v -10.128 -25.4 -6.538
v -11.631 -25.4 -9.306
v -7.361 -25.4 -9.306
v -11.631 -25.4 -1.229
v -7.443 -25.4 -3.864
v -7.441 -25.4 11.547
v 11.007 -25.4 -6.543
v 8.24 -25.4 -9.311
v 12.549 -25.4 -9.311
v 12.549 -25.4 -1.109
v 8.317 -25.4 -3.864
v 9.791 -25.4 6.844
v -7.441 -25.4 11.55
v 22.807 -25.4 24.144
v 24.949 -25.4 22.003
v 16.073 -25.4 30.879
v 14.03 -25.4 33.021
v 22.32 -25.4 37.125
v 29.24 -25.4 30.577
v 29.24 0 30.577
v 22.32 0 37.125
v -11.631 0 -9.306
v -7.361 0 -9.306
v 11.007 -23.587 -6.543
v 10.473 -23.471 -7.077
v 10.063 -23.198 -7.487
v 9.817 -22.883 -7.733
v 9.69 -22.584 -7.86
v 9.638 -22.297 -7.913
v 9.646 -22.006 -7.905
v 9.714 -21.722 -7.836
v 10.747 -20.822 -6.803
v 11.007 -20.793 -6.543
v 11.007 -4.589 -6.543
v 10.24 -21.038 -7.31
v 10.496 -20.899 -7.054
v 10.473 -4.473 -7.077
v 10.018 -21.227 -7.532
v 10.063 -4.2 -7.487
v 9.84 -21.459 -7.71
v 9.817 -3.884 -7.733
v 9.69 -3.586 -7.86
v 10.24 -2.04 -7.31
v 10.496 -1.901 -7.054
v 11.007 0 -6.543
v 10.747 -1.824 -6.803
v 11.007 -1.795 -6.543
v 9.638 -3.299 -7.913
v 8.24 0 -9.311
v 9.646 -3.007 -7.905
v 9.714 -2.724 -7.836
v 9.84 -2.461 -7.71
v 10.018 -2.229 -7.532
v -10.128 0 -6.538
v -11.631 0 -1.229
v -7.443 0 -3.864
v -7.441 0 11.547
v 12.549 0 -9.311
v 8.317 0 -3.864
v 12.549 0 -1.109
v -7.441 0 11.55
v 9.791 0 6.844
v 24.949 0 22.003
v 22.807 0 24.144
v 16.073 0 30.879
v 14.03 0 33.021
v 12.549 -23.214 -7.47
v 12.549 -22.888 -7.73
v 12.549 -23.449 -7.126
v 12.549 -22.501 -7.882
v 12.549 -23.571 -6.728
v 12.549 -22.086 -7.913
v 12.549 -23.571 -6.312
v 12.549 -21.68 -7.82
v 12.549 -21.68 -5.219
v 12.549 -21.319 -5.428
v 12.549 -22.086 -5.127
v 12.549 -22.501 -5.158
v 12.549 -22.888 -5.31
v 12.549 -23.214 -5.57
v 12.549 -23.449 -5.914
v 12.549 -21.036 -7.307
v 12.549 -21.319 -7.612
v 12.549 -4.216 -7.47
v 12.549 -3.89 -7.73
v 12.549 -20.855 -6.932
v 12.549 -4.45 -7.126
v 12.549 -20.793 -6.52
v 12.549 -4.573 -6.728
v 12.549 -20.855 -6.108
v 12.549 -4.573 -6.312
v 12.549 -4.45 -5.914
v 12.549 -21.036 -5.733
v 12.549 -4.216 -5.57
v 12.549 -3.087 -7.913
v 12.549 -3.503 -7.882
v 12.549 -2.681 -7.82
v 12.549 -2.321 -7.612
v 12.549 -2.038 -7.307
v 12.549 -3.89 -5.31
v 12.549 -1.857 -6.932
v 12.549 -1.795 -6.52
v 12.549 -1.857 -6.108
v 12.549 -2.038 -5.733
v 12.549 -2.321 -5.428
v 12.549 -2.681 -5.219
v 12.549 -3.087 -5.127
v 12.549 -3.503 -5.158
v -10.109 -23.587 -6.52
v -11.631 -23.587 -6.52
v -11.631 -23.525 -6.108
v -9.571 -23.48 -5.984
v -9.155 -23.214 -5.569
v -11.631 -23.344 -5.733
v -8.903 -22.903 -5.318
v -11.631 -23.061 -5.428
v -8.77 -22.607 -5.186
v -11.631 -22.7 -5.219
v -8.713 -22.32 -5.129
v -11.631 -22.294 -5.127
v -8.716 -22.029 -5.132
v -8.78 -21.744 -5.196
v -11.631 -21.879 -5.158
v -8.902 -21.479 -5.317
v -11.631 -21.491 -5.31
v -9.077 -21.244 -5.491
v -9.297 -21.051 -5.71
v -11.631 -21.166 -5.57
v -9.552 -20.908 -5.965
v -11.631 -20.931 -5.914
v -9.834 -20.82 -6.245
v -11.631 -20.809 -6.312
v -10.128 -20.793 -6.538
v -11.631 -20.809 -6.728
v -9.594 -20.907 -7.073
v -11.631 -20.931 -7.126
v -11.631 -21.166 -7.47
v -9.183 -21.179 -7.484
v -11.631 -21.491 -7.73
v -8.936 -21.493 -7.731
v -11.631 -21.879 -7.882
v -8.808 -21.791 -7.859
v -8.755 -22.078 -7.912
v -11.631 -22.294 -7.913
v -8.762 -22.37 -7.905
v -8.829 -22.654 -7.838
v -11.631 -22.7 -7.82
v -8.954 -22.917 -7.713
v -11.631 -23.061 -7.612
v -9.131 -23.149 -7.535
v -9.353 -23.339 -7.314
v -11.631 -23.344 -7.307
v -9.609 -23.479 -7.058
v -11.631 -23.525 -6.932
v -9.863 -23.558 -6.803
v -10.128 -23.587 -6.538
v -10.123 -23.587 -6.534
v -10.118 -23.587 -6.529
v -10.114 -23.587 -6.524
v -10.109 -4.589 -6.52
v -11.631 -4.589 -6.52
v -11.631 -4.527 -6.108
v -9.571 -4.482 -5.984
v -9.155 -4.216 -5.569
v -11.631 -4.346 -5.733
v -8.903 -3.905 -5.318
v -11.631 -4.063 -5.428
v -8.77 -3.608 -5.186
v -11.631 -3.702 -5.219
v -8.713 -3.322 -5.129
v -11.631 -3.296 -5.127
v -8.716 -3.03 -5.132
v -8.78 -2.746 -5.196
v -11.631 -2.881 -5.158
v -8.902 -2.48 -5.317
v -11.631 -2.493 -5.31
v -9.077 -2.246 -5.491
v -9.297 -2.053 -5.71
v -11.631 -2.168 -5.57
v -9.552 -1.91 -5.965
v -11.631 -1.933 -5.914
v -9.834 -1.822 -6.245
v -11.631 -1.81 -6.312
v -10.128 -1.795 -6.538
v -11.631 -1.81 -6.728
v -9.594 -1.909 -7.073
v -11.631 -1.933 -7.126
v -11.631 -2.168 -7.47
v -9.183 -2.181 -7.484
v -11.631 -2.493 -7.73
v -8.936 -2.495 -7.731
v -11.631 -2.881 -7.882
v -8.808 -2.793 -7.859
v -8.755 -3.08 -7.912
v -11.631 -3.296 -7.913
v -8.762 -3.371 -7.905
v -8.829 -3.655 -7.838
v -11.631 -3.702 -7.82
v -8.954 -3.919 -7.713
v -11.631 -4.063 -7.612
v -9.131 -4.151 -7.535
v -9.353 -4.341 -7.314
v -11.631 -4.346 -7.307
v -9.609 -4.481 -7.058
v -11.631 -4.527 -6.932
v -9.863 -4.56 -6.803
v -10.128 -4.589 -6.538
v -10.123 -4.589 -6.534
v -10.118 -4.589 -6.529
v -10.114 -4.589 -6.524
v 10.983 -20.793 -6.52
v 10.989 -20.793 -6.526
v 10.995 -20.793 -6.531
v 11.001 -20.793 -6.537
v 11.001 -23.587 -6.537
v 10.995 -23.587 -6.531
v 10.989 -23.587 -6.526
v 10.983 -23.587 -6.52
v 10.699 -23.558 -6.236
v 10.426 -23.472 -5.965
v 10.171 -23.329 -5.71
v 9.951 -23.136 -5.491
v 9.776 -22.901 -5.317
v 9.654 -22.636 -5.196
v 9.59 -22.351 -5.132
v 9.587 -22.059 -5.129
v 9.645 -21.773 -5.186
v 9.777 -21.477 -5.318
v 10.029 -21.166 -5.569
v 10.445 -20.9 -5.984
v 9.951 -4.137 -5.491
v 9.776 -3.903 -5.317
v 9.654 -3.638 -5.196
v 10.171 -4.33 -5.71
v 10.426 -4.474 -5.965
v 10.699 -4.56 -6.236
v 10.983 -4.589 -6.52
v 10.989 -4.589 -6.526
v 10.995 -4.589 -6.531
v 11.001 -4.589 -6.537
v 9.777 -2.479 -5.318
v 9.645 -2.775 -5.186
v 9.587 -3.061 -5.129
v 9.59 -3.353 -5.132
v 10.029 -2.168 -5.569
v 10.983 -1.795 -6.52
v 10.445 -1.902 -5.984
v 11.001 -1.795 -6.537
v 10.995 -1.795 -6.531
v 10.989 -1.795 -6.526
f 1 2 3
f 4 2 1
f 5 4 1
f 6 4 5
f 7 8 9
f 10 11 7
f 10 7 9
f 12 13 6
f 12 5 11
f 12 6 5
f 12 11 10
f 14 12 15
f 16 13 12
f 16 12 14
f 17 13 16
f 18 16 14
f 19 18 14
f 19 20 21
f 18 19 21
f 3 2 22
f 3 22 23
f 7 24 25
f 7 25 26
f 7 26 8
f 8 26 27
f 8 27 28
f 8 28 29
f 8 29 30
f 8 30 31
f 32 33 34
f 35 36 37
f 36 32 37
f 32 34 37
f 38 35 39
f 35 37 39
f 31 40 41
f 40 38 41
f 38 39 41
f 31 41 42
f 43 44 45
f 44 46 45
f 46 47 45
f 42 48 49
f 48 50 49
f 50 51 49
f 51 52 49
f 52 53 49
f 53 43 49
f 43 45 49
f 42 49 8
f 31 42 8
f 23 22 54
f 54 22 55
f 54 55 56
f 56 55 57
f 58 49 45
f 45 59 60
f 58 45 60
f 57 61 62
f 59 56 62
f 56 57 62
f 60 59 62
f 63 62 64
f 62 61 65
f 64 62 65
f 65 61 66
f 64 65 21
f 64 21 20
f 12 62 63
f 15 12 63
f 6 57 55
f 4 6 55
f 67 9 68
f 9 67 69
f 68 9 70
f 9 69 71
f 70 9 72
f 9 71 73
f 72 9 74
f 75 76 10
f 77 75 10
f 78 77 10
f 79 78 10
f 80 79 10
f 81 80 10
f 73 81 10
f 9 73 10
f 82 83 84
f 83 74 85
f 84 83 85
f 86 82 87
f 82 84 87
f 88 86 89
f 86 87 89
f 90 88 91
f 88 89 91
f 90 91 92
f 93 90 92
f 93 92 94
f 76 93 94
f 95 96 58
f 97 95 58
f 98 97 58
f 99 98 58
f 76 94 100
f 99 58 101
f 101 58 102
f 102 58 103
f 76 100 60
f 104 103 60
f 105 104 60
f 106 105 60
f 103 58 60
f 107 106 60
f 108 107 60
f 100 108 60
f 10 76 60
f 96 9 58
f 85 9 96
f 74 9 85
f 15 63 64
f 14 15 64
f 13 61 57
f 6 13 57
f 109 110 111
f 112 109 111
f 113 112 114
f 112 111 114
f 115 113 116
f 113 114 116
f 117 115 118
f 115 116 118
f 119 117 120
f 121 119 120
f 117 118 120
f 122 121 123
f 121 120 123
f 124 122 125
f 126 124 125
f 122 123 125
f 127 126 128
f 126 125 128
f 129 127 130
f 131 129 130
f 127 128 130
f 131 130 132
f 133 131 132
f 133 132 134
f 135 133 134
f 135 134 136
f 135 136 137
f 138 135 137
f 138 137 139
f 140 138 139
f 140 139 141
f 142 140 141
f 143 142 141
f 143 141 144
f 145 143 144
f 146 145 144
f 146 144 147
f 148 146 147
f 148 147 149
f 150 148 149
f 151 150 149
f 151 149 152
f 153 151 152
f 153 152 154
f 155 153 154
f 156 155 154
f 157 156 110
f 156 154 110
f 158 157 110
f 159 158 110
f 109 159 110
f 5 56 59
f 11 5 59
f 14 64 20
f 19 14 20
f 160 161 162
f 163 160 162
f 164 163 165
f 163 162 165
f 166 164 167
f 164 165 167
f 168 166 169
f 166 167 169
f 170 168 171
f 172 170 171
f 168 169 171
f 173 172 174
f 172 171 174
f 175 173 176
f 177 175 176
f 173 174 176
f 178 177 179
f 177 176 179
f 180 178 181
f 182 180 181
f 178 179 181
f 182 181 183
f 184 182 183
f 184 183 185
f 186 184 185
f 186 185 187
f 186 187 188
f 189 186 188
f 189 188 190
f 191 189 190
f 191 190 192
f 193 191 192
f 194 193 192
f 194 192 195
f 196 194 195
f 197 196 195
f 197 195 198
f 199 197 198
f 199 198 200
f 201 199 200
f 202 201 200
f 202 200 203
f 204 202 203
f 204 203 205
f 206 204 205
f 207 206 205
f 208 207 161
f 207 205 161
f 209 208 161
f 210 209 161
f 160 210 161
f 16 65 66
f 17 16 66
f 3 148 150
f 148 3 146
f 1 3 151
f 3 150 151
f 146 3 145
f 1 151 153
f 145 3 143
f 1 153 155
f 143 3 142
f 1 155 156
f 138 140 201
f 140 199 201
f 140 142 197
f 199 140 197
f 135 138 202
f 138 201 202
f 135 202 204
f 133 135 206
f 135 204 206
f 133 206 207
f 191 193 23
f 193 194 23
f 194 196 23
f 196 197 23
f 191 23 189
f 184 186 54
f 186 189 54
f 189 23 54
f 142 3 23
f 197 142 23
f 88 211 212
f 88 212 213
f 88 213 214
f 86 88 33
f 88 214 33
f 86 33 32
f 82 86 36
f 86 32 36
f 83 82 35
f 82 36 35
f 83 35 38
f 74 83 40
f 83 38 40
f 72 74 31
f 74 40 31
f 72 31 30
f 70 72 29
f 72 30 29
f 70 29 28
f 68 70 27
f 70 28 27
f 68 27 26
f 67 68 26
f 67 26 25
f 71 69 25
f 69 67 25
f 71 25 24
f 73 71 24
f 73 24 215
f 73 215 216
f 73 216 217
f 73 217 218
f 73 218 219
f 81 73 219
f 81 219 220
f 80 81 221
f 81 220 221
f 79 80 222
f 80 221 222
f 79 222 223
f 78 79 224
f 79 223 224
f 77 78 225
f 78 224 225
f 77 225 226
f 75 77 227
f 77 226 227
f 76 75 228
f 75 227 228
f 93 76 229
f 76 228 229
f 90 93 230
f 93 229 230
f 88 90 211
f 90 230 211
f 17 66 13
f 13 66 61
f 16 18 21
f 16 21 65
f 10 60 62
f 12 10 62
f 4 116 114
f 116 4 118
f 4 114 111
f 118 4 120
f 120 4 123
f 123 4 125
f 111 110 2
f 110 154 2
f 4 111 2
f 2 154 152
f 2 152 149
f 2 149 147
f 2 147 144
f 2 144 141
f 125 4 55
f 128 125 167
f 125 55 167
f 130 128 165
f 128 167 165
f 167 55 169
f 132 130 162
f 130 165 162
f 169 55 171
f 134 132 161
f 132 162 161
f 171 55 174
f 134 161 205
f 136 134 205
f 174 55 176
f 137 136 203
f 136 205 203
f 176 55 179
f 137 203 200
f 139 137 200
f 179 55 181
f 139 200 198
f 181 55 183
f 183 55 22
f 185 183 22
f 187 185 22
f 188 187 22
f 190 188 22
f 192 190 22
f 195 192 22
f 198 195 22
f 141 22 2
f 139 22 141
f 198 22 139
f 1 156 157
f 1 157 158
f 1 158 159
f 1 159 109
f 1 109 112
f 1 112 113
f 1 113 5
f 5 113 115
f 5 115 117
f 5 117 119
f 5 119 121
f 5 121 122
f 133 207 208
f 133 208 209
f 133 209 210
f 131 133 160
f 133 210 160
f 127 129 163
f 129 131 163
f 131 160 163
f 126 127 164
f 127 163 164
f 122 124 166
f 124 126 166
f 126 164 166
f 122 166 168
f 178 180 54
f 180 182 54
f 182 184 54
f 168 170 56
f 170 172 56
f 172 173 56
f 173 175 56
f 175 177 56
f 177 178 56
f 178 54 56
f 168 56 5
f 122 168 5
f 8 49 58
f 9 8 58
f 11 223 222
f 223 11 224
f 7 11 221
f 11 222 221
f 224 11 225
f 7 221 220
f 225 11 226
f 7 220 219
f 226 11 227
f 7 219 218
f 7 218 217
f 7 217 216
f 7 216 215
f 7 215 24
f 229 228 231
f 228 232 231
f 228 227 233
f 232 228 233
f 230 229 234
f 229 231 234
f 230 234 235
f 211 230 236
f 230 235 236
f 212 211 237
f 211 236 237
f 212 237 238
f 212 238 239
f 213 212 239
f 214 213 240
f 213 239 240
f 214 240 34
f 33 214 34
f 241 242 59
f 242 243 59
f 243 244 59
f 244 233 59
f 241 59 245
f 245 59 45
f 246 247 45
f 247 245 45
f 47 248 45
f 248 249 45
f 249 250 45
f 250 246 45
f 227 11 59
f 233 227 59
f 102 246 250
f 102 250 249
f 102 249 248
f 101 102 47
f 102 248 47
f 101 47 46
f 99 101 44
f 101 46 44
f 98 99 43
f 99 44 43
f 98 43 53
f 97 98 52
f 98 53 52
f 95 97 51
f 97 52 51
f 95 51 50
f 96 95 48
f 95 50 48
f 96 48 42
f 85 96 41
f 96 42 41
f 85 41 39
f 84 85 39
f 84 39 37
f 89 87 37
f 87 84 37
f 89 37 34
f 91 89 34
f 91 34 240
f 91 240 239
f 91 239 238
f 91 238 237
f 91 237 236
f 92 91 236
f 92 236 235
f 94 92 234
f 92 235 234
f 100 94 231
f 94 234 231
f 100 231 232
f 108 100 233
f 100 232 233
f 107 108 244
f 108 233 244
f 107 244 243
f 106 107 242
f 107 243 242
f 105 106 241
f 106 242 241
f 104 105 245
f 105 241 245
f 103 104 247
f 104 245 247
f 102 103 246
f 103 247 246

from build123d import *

# Parameters (mm, degrees)
F1_DEPTH = 25.4
F3_D     = 2.794
F3_DEPTH = 25.4
F3_TIP   = 0.8394022848
F4_D     = 2.794
F4_DEPTH = 25.4
F4_START = 10.1278152
F4_TIP   = 0.8394022848


# Not quite as in the source:
# - ends of sketch curves that miss each other by under 0.0002 mm in the source are joined
# - a feature names something its author has since deleted; it is built from what else it names


with BuildPart() as f1:
    # F0 (on Front) → F1 (new body)
    with BuildSketch(Plane.XZ):
        Polygon((11.0066256276, -6.5430273301), (8.240193387, -9.310965985), (12.5485987193, -9.310965985), (12.5485987193, -1.1086727812), (9.7906497979, 6.8444932552), (24.9488617122, 22.0027051695), (22.8072959293, 24.1442709524), (29.2404852808, 30.5774603039), (22.3196721338, 37.1254323684), (16.0729033236, 30.8786635582), (14.0302290969, 33.0205648235), (13.9806155776, 32.9709513042), (-7.4406042695, 11.5497314571), (-7.4406041338, 11.5466563515), (-7.4413635659, 11.5474157835), (-11.6305711889, -1.2286720797), (-11.6305711889, -9.3063699081), (-7.3613829189, -9.3063699081), (-10.1278151595, -6.5384312532), (-7.4425795762, -3.8636476732), (8.3167760077, -3.8636476732), align=None)
    extrude(amount=F1_DEPTH)

    # F3 (one way)
    with BuildSketch(Plane(origin=(0, 0, 0), x_dir=(0, 1, 0), z_dir=(-1, 0, 0))):
        with Locations((-22.1899207681, 6.5197679214), (-3.1917574815, 6.5197679214)):
            Circle(F3_D / 2)
    extrude(amount=-F3_DEPTH, mode=Mode.SUBTRACT)
    with Locations(Plane(origin=(0, 0, 0), x_dir=(0, 1, 0), z_dir=(-1, 0, 0))):
        with Locations((-22.1899207681, 6.5197679214), (-3.1917574815, 6.5197679214)):
            with Locations((0, 0, -(F3_DEPTH + F3_TIP / 2))):  # 118° drill point
                Cone(0, F3_D / 2, F3_TIP, mode=Mode.SUBTRACT)

    # F4
    # its depths count from where the whole tool has entered the part; down to there all is cleared
    with Locations(Plane.YZ.offset(-F4_START)):
        with Locations((-3.1917574815, -6.5197679214), (-22.1899207681, -6.5197679214)):
            Hole(F4_D / 2, depth=F4_DEPTH)
            with Locations((0, 0, -(F4_DEPTH + F4_TIP / 2))):  # 118° drill point
                Cone(0, F4_D / 2, F4_TIP, mode=Mode.SUBTRACT)


solid = f1.part
